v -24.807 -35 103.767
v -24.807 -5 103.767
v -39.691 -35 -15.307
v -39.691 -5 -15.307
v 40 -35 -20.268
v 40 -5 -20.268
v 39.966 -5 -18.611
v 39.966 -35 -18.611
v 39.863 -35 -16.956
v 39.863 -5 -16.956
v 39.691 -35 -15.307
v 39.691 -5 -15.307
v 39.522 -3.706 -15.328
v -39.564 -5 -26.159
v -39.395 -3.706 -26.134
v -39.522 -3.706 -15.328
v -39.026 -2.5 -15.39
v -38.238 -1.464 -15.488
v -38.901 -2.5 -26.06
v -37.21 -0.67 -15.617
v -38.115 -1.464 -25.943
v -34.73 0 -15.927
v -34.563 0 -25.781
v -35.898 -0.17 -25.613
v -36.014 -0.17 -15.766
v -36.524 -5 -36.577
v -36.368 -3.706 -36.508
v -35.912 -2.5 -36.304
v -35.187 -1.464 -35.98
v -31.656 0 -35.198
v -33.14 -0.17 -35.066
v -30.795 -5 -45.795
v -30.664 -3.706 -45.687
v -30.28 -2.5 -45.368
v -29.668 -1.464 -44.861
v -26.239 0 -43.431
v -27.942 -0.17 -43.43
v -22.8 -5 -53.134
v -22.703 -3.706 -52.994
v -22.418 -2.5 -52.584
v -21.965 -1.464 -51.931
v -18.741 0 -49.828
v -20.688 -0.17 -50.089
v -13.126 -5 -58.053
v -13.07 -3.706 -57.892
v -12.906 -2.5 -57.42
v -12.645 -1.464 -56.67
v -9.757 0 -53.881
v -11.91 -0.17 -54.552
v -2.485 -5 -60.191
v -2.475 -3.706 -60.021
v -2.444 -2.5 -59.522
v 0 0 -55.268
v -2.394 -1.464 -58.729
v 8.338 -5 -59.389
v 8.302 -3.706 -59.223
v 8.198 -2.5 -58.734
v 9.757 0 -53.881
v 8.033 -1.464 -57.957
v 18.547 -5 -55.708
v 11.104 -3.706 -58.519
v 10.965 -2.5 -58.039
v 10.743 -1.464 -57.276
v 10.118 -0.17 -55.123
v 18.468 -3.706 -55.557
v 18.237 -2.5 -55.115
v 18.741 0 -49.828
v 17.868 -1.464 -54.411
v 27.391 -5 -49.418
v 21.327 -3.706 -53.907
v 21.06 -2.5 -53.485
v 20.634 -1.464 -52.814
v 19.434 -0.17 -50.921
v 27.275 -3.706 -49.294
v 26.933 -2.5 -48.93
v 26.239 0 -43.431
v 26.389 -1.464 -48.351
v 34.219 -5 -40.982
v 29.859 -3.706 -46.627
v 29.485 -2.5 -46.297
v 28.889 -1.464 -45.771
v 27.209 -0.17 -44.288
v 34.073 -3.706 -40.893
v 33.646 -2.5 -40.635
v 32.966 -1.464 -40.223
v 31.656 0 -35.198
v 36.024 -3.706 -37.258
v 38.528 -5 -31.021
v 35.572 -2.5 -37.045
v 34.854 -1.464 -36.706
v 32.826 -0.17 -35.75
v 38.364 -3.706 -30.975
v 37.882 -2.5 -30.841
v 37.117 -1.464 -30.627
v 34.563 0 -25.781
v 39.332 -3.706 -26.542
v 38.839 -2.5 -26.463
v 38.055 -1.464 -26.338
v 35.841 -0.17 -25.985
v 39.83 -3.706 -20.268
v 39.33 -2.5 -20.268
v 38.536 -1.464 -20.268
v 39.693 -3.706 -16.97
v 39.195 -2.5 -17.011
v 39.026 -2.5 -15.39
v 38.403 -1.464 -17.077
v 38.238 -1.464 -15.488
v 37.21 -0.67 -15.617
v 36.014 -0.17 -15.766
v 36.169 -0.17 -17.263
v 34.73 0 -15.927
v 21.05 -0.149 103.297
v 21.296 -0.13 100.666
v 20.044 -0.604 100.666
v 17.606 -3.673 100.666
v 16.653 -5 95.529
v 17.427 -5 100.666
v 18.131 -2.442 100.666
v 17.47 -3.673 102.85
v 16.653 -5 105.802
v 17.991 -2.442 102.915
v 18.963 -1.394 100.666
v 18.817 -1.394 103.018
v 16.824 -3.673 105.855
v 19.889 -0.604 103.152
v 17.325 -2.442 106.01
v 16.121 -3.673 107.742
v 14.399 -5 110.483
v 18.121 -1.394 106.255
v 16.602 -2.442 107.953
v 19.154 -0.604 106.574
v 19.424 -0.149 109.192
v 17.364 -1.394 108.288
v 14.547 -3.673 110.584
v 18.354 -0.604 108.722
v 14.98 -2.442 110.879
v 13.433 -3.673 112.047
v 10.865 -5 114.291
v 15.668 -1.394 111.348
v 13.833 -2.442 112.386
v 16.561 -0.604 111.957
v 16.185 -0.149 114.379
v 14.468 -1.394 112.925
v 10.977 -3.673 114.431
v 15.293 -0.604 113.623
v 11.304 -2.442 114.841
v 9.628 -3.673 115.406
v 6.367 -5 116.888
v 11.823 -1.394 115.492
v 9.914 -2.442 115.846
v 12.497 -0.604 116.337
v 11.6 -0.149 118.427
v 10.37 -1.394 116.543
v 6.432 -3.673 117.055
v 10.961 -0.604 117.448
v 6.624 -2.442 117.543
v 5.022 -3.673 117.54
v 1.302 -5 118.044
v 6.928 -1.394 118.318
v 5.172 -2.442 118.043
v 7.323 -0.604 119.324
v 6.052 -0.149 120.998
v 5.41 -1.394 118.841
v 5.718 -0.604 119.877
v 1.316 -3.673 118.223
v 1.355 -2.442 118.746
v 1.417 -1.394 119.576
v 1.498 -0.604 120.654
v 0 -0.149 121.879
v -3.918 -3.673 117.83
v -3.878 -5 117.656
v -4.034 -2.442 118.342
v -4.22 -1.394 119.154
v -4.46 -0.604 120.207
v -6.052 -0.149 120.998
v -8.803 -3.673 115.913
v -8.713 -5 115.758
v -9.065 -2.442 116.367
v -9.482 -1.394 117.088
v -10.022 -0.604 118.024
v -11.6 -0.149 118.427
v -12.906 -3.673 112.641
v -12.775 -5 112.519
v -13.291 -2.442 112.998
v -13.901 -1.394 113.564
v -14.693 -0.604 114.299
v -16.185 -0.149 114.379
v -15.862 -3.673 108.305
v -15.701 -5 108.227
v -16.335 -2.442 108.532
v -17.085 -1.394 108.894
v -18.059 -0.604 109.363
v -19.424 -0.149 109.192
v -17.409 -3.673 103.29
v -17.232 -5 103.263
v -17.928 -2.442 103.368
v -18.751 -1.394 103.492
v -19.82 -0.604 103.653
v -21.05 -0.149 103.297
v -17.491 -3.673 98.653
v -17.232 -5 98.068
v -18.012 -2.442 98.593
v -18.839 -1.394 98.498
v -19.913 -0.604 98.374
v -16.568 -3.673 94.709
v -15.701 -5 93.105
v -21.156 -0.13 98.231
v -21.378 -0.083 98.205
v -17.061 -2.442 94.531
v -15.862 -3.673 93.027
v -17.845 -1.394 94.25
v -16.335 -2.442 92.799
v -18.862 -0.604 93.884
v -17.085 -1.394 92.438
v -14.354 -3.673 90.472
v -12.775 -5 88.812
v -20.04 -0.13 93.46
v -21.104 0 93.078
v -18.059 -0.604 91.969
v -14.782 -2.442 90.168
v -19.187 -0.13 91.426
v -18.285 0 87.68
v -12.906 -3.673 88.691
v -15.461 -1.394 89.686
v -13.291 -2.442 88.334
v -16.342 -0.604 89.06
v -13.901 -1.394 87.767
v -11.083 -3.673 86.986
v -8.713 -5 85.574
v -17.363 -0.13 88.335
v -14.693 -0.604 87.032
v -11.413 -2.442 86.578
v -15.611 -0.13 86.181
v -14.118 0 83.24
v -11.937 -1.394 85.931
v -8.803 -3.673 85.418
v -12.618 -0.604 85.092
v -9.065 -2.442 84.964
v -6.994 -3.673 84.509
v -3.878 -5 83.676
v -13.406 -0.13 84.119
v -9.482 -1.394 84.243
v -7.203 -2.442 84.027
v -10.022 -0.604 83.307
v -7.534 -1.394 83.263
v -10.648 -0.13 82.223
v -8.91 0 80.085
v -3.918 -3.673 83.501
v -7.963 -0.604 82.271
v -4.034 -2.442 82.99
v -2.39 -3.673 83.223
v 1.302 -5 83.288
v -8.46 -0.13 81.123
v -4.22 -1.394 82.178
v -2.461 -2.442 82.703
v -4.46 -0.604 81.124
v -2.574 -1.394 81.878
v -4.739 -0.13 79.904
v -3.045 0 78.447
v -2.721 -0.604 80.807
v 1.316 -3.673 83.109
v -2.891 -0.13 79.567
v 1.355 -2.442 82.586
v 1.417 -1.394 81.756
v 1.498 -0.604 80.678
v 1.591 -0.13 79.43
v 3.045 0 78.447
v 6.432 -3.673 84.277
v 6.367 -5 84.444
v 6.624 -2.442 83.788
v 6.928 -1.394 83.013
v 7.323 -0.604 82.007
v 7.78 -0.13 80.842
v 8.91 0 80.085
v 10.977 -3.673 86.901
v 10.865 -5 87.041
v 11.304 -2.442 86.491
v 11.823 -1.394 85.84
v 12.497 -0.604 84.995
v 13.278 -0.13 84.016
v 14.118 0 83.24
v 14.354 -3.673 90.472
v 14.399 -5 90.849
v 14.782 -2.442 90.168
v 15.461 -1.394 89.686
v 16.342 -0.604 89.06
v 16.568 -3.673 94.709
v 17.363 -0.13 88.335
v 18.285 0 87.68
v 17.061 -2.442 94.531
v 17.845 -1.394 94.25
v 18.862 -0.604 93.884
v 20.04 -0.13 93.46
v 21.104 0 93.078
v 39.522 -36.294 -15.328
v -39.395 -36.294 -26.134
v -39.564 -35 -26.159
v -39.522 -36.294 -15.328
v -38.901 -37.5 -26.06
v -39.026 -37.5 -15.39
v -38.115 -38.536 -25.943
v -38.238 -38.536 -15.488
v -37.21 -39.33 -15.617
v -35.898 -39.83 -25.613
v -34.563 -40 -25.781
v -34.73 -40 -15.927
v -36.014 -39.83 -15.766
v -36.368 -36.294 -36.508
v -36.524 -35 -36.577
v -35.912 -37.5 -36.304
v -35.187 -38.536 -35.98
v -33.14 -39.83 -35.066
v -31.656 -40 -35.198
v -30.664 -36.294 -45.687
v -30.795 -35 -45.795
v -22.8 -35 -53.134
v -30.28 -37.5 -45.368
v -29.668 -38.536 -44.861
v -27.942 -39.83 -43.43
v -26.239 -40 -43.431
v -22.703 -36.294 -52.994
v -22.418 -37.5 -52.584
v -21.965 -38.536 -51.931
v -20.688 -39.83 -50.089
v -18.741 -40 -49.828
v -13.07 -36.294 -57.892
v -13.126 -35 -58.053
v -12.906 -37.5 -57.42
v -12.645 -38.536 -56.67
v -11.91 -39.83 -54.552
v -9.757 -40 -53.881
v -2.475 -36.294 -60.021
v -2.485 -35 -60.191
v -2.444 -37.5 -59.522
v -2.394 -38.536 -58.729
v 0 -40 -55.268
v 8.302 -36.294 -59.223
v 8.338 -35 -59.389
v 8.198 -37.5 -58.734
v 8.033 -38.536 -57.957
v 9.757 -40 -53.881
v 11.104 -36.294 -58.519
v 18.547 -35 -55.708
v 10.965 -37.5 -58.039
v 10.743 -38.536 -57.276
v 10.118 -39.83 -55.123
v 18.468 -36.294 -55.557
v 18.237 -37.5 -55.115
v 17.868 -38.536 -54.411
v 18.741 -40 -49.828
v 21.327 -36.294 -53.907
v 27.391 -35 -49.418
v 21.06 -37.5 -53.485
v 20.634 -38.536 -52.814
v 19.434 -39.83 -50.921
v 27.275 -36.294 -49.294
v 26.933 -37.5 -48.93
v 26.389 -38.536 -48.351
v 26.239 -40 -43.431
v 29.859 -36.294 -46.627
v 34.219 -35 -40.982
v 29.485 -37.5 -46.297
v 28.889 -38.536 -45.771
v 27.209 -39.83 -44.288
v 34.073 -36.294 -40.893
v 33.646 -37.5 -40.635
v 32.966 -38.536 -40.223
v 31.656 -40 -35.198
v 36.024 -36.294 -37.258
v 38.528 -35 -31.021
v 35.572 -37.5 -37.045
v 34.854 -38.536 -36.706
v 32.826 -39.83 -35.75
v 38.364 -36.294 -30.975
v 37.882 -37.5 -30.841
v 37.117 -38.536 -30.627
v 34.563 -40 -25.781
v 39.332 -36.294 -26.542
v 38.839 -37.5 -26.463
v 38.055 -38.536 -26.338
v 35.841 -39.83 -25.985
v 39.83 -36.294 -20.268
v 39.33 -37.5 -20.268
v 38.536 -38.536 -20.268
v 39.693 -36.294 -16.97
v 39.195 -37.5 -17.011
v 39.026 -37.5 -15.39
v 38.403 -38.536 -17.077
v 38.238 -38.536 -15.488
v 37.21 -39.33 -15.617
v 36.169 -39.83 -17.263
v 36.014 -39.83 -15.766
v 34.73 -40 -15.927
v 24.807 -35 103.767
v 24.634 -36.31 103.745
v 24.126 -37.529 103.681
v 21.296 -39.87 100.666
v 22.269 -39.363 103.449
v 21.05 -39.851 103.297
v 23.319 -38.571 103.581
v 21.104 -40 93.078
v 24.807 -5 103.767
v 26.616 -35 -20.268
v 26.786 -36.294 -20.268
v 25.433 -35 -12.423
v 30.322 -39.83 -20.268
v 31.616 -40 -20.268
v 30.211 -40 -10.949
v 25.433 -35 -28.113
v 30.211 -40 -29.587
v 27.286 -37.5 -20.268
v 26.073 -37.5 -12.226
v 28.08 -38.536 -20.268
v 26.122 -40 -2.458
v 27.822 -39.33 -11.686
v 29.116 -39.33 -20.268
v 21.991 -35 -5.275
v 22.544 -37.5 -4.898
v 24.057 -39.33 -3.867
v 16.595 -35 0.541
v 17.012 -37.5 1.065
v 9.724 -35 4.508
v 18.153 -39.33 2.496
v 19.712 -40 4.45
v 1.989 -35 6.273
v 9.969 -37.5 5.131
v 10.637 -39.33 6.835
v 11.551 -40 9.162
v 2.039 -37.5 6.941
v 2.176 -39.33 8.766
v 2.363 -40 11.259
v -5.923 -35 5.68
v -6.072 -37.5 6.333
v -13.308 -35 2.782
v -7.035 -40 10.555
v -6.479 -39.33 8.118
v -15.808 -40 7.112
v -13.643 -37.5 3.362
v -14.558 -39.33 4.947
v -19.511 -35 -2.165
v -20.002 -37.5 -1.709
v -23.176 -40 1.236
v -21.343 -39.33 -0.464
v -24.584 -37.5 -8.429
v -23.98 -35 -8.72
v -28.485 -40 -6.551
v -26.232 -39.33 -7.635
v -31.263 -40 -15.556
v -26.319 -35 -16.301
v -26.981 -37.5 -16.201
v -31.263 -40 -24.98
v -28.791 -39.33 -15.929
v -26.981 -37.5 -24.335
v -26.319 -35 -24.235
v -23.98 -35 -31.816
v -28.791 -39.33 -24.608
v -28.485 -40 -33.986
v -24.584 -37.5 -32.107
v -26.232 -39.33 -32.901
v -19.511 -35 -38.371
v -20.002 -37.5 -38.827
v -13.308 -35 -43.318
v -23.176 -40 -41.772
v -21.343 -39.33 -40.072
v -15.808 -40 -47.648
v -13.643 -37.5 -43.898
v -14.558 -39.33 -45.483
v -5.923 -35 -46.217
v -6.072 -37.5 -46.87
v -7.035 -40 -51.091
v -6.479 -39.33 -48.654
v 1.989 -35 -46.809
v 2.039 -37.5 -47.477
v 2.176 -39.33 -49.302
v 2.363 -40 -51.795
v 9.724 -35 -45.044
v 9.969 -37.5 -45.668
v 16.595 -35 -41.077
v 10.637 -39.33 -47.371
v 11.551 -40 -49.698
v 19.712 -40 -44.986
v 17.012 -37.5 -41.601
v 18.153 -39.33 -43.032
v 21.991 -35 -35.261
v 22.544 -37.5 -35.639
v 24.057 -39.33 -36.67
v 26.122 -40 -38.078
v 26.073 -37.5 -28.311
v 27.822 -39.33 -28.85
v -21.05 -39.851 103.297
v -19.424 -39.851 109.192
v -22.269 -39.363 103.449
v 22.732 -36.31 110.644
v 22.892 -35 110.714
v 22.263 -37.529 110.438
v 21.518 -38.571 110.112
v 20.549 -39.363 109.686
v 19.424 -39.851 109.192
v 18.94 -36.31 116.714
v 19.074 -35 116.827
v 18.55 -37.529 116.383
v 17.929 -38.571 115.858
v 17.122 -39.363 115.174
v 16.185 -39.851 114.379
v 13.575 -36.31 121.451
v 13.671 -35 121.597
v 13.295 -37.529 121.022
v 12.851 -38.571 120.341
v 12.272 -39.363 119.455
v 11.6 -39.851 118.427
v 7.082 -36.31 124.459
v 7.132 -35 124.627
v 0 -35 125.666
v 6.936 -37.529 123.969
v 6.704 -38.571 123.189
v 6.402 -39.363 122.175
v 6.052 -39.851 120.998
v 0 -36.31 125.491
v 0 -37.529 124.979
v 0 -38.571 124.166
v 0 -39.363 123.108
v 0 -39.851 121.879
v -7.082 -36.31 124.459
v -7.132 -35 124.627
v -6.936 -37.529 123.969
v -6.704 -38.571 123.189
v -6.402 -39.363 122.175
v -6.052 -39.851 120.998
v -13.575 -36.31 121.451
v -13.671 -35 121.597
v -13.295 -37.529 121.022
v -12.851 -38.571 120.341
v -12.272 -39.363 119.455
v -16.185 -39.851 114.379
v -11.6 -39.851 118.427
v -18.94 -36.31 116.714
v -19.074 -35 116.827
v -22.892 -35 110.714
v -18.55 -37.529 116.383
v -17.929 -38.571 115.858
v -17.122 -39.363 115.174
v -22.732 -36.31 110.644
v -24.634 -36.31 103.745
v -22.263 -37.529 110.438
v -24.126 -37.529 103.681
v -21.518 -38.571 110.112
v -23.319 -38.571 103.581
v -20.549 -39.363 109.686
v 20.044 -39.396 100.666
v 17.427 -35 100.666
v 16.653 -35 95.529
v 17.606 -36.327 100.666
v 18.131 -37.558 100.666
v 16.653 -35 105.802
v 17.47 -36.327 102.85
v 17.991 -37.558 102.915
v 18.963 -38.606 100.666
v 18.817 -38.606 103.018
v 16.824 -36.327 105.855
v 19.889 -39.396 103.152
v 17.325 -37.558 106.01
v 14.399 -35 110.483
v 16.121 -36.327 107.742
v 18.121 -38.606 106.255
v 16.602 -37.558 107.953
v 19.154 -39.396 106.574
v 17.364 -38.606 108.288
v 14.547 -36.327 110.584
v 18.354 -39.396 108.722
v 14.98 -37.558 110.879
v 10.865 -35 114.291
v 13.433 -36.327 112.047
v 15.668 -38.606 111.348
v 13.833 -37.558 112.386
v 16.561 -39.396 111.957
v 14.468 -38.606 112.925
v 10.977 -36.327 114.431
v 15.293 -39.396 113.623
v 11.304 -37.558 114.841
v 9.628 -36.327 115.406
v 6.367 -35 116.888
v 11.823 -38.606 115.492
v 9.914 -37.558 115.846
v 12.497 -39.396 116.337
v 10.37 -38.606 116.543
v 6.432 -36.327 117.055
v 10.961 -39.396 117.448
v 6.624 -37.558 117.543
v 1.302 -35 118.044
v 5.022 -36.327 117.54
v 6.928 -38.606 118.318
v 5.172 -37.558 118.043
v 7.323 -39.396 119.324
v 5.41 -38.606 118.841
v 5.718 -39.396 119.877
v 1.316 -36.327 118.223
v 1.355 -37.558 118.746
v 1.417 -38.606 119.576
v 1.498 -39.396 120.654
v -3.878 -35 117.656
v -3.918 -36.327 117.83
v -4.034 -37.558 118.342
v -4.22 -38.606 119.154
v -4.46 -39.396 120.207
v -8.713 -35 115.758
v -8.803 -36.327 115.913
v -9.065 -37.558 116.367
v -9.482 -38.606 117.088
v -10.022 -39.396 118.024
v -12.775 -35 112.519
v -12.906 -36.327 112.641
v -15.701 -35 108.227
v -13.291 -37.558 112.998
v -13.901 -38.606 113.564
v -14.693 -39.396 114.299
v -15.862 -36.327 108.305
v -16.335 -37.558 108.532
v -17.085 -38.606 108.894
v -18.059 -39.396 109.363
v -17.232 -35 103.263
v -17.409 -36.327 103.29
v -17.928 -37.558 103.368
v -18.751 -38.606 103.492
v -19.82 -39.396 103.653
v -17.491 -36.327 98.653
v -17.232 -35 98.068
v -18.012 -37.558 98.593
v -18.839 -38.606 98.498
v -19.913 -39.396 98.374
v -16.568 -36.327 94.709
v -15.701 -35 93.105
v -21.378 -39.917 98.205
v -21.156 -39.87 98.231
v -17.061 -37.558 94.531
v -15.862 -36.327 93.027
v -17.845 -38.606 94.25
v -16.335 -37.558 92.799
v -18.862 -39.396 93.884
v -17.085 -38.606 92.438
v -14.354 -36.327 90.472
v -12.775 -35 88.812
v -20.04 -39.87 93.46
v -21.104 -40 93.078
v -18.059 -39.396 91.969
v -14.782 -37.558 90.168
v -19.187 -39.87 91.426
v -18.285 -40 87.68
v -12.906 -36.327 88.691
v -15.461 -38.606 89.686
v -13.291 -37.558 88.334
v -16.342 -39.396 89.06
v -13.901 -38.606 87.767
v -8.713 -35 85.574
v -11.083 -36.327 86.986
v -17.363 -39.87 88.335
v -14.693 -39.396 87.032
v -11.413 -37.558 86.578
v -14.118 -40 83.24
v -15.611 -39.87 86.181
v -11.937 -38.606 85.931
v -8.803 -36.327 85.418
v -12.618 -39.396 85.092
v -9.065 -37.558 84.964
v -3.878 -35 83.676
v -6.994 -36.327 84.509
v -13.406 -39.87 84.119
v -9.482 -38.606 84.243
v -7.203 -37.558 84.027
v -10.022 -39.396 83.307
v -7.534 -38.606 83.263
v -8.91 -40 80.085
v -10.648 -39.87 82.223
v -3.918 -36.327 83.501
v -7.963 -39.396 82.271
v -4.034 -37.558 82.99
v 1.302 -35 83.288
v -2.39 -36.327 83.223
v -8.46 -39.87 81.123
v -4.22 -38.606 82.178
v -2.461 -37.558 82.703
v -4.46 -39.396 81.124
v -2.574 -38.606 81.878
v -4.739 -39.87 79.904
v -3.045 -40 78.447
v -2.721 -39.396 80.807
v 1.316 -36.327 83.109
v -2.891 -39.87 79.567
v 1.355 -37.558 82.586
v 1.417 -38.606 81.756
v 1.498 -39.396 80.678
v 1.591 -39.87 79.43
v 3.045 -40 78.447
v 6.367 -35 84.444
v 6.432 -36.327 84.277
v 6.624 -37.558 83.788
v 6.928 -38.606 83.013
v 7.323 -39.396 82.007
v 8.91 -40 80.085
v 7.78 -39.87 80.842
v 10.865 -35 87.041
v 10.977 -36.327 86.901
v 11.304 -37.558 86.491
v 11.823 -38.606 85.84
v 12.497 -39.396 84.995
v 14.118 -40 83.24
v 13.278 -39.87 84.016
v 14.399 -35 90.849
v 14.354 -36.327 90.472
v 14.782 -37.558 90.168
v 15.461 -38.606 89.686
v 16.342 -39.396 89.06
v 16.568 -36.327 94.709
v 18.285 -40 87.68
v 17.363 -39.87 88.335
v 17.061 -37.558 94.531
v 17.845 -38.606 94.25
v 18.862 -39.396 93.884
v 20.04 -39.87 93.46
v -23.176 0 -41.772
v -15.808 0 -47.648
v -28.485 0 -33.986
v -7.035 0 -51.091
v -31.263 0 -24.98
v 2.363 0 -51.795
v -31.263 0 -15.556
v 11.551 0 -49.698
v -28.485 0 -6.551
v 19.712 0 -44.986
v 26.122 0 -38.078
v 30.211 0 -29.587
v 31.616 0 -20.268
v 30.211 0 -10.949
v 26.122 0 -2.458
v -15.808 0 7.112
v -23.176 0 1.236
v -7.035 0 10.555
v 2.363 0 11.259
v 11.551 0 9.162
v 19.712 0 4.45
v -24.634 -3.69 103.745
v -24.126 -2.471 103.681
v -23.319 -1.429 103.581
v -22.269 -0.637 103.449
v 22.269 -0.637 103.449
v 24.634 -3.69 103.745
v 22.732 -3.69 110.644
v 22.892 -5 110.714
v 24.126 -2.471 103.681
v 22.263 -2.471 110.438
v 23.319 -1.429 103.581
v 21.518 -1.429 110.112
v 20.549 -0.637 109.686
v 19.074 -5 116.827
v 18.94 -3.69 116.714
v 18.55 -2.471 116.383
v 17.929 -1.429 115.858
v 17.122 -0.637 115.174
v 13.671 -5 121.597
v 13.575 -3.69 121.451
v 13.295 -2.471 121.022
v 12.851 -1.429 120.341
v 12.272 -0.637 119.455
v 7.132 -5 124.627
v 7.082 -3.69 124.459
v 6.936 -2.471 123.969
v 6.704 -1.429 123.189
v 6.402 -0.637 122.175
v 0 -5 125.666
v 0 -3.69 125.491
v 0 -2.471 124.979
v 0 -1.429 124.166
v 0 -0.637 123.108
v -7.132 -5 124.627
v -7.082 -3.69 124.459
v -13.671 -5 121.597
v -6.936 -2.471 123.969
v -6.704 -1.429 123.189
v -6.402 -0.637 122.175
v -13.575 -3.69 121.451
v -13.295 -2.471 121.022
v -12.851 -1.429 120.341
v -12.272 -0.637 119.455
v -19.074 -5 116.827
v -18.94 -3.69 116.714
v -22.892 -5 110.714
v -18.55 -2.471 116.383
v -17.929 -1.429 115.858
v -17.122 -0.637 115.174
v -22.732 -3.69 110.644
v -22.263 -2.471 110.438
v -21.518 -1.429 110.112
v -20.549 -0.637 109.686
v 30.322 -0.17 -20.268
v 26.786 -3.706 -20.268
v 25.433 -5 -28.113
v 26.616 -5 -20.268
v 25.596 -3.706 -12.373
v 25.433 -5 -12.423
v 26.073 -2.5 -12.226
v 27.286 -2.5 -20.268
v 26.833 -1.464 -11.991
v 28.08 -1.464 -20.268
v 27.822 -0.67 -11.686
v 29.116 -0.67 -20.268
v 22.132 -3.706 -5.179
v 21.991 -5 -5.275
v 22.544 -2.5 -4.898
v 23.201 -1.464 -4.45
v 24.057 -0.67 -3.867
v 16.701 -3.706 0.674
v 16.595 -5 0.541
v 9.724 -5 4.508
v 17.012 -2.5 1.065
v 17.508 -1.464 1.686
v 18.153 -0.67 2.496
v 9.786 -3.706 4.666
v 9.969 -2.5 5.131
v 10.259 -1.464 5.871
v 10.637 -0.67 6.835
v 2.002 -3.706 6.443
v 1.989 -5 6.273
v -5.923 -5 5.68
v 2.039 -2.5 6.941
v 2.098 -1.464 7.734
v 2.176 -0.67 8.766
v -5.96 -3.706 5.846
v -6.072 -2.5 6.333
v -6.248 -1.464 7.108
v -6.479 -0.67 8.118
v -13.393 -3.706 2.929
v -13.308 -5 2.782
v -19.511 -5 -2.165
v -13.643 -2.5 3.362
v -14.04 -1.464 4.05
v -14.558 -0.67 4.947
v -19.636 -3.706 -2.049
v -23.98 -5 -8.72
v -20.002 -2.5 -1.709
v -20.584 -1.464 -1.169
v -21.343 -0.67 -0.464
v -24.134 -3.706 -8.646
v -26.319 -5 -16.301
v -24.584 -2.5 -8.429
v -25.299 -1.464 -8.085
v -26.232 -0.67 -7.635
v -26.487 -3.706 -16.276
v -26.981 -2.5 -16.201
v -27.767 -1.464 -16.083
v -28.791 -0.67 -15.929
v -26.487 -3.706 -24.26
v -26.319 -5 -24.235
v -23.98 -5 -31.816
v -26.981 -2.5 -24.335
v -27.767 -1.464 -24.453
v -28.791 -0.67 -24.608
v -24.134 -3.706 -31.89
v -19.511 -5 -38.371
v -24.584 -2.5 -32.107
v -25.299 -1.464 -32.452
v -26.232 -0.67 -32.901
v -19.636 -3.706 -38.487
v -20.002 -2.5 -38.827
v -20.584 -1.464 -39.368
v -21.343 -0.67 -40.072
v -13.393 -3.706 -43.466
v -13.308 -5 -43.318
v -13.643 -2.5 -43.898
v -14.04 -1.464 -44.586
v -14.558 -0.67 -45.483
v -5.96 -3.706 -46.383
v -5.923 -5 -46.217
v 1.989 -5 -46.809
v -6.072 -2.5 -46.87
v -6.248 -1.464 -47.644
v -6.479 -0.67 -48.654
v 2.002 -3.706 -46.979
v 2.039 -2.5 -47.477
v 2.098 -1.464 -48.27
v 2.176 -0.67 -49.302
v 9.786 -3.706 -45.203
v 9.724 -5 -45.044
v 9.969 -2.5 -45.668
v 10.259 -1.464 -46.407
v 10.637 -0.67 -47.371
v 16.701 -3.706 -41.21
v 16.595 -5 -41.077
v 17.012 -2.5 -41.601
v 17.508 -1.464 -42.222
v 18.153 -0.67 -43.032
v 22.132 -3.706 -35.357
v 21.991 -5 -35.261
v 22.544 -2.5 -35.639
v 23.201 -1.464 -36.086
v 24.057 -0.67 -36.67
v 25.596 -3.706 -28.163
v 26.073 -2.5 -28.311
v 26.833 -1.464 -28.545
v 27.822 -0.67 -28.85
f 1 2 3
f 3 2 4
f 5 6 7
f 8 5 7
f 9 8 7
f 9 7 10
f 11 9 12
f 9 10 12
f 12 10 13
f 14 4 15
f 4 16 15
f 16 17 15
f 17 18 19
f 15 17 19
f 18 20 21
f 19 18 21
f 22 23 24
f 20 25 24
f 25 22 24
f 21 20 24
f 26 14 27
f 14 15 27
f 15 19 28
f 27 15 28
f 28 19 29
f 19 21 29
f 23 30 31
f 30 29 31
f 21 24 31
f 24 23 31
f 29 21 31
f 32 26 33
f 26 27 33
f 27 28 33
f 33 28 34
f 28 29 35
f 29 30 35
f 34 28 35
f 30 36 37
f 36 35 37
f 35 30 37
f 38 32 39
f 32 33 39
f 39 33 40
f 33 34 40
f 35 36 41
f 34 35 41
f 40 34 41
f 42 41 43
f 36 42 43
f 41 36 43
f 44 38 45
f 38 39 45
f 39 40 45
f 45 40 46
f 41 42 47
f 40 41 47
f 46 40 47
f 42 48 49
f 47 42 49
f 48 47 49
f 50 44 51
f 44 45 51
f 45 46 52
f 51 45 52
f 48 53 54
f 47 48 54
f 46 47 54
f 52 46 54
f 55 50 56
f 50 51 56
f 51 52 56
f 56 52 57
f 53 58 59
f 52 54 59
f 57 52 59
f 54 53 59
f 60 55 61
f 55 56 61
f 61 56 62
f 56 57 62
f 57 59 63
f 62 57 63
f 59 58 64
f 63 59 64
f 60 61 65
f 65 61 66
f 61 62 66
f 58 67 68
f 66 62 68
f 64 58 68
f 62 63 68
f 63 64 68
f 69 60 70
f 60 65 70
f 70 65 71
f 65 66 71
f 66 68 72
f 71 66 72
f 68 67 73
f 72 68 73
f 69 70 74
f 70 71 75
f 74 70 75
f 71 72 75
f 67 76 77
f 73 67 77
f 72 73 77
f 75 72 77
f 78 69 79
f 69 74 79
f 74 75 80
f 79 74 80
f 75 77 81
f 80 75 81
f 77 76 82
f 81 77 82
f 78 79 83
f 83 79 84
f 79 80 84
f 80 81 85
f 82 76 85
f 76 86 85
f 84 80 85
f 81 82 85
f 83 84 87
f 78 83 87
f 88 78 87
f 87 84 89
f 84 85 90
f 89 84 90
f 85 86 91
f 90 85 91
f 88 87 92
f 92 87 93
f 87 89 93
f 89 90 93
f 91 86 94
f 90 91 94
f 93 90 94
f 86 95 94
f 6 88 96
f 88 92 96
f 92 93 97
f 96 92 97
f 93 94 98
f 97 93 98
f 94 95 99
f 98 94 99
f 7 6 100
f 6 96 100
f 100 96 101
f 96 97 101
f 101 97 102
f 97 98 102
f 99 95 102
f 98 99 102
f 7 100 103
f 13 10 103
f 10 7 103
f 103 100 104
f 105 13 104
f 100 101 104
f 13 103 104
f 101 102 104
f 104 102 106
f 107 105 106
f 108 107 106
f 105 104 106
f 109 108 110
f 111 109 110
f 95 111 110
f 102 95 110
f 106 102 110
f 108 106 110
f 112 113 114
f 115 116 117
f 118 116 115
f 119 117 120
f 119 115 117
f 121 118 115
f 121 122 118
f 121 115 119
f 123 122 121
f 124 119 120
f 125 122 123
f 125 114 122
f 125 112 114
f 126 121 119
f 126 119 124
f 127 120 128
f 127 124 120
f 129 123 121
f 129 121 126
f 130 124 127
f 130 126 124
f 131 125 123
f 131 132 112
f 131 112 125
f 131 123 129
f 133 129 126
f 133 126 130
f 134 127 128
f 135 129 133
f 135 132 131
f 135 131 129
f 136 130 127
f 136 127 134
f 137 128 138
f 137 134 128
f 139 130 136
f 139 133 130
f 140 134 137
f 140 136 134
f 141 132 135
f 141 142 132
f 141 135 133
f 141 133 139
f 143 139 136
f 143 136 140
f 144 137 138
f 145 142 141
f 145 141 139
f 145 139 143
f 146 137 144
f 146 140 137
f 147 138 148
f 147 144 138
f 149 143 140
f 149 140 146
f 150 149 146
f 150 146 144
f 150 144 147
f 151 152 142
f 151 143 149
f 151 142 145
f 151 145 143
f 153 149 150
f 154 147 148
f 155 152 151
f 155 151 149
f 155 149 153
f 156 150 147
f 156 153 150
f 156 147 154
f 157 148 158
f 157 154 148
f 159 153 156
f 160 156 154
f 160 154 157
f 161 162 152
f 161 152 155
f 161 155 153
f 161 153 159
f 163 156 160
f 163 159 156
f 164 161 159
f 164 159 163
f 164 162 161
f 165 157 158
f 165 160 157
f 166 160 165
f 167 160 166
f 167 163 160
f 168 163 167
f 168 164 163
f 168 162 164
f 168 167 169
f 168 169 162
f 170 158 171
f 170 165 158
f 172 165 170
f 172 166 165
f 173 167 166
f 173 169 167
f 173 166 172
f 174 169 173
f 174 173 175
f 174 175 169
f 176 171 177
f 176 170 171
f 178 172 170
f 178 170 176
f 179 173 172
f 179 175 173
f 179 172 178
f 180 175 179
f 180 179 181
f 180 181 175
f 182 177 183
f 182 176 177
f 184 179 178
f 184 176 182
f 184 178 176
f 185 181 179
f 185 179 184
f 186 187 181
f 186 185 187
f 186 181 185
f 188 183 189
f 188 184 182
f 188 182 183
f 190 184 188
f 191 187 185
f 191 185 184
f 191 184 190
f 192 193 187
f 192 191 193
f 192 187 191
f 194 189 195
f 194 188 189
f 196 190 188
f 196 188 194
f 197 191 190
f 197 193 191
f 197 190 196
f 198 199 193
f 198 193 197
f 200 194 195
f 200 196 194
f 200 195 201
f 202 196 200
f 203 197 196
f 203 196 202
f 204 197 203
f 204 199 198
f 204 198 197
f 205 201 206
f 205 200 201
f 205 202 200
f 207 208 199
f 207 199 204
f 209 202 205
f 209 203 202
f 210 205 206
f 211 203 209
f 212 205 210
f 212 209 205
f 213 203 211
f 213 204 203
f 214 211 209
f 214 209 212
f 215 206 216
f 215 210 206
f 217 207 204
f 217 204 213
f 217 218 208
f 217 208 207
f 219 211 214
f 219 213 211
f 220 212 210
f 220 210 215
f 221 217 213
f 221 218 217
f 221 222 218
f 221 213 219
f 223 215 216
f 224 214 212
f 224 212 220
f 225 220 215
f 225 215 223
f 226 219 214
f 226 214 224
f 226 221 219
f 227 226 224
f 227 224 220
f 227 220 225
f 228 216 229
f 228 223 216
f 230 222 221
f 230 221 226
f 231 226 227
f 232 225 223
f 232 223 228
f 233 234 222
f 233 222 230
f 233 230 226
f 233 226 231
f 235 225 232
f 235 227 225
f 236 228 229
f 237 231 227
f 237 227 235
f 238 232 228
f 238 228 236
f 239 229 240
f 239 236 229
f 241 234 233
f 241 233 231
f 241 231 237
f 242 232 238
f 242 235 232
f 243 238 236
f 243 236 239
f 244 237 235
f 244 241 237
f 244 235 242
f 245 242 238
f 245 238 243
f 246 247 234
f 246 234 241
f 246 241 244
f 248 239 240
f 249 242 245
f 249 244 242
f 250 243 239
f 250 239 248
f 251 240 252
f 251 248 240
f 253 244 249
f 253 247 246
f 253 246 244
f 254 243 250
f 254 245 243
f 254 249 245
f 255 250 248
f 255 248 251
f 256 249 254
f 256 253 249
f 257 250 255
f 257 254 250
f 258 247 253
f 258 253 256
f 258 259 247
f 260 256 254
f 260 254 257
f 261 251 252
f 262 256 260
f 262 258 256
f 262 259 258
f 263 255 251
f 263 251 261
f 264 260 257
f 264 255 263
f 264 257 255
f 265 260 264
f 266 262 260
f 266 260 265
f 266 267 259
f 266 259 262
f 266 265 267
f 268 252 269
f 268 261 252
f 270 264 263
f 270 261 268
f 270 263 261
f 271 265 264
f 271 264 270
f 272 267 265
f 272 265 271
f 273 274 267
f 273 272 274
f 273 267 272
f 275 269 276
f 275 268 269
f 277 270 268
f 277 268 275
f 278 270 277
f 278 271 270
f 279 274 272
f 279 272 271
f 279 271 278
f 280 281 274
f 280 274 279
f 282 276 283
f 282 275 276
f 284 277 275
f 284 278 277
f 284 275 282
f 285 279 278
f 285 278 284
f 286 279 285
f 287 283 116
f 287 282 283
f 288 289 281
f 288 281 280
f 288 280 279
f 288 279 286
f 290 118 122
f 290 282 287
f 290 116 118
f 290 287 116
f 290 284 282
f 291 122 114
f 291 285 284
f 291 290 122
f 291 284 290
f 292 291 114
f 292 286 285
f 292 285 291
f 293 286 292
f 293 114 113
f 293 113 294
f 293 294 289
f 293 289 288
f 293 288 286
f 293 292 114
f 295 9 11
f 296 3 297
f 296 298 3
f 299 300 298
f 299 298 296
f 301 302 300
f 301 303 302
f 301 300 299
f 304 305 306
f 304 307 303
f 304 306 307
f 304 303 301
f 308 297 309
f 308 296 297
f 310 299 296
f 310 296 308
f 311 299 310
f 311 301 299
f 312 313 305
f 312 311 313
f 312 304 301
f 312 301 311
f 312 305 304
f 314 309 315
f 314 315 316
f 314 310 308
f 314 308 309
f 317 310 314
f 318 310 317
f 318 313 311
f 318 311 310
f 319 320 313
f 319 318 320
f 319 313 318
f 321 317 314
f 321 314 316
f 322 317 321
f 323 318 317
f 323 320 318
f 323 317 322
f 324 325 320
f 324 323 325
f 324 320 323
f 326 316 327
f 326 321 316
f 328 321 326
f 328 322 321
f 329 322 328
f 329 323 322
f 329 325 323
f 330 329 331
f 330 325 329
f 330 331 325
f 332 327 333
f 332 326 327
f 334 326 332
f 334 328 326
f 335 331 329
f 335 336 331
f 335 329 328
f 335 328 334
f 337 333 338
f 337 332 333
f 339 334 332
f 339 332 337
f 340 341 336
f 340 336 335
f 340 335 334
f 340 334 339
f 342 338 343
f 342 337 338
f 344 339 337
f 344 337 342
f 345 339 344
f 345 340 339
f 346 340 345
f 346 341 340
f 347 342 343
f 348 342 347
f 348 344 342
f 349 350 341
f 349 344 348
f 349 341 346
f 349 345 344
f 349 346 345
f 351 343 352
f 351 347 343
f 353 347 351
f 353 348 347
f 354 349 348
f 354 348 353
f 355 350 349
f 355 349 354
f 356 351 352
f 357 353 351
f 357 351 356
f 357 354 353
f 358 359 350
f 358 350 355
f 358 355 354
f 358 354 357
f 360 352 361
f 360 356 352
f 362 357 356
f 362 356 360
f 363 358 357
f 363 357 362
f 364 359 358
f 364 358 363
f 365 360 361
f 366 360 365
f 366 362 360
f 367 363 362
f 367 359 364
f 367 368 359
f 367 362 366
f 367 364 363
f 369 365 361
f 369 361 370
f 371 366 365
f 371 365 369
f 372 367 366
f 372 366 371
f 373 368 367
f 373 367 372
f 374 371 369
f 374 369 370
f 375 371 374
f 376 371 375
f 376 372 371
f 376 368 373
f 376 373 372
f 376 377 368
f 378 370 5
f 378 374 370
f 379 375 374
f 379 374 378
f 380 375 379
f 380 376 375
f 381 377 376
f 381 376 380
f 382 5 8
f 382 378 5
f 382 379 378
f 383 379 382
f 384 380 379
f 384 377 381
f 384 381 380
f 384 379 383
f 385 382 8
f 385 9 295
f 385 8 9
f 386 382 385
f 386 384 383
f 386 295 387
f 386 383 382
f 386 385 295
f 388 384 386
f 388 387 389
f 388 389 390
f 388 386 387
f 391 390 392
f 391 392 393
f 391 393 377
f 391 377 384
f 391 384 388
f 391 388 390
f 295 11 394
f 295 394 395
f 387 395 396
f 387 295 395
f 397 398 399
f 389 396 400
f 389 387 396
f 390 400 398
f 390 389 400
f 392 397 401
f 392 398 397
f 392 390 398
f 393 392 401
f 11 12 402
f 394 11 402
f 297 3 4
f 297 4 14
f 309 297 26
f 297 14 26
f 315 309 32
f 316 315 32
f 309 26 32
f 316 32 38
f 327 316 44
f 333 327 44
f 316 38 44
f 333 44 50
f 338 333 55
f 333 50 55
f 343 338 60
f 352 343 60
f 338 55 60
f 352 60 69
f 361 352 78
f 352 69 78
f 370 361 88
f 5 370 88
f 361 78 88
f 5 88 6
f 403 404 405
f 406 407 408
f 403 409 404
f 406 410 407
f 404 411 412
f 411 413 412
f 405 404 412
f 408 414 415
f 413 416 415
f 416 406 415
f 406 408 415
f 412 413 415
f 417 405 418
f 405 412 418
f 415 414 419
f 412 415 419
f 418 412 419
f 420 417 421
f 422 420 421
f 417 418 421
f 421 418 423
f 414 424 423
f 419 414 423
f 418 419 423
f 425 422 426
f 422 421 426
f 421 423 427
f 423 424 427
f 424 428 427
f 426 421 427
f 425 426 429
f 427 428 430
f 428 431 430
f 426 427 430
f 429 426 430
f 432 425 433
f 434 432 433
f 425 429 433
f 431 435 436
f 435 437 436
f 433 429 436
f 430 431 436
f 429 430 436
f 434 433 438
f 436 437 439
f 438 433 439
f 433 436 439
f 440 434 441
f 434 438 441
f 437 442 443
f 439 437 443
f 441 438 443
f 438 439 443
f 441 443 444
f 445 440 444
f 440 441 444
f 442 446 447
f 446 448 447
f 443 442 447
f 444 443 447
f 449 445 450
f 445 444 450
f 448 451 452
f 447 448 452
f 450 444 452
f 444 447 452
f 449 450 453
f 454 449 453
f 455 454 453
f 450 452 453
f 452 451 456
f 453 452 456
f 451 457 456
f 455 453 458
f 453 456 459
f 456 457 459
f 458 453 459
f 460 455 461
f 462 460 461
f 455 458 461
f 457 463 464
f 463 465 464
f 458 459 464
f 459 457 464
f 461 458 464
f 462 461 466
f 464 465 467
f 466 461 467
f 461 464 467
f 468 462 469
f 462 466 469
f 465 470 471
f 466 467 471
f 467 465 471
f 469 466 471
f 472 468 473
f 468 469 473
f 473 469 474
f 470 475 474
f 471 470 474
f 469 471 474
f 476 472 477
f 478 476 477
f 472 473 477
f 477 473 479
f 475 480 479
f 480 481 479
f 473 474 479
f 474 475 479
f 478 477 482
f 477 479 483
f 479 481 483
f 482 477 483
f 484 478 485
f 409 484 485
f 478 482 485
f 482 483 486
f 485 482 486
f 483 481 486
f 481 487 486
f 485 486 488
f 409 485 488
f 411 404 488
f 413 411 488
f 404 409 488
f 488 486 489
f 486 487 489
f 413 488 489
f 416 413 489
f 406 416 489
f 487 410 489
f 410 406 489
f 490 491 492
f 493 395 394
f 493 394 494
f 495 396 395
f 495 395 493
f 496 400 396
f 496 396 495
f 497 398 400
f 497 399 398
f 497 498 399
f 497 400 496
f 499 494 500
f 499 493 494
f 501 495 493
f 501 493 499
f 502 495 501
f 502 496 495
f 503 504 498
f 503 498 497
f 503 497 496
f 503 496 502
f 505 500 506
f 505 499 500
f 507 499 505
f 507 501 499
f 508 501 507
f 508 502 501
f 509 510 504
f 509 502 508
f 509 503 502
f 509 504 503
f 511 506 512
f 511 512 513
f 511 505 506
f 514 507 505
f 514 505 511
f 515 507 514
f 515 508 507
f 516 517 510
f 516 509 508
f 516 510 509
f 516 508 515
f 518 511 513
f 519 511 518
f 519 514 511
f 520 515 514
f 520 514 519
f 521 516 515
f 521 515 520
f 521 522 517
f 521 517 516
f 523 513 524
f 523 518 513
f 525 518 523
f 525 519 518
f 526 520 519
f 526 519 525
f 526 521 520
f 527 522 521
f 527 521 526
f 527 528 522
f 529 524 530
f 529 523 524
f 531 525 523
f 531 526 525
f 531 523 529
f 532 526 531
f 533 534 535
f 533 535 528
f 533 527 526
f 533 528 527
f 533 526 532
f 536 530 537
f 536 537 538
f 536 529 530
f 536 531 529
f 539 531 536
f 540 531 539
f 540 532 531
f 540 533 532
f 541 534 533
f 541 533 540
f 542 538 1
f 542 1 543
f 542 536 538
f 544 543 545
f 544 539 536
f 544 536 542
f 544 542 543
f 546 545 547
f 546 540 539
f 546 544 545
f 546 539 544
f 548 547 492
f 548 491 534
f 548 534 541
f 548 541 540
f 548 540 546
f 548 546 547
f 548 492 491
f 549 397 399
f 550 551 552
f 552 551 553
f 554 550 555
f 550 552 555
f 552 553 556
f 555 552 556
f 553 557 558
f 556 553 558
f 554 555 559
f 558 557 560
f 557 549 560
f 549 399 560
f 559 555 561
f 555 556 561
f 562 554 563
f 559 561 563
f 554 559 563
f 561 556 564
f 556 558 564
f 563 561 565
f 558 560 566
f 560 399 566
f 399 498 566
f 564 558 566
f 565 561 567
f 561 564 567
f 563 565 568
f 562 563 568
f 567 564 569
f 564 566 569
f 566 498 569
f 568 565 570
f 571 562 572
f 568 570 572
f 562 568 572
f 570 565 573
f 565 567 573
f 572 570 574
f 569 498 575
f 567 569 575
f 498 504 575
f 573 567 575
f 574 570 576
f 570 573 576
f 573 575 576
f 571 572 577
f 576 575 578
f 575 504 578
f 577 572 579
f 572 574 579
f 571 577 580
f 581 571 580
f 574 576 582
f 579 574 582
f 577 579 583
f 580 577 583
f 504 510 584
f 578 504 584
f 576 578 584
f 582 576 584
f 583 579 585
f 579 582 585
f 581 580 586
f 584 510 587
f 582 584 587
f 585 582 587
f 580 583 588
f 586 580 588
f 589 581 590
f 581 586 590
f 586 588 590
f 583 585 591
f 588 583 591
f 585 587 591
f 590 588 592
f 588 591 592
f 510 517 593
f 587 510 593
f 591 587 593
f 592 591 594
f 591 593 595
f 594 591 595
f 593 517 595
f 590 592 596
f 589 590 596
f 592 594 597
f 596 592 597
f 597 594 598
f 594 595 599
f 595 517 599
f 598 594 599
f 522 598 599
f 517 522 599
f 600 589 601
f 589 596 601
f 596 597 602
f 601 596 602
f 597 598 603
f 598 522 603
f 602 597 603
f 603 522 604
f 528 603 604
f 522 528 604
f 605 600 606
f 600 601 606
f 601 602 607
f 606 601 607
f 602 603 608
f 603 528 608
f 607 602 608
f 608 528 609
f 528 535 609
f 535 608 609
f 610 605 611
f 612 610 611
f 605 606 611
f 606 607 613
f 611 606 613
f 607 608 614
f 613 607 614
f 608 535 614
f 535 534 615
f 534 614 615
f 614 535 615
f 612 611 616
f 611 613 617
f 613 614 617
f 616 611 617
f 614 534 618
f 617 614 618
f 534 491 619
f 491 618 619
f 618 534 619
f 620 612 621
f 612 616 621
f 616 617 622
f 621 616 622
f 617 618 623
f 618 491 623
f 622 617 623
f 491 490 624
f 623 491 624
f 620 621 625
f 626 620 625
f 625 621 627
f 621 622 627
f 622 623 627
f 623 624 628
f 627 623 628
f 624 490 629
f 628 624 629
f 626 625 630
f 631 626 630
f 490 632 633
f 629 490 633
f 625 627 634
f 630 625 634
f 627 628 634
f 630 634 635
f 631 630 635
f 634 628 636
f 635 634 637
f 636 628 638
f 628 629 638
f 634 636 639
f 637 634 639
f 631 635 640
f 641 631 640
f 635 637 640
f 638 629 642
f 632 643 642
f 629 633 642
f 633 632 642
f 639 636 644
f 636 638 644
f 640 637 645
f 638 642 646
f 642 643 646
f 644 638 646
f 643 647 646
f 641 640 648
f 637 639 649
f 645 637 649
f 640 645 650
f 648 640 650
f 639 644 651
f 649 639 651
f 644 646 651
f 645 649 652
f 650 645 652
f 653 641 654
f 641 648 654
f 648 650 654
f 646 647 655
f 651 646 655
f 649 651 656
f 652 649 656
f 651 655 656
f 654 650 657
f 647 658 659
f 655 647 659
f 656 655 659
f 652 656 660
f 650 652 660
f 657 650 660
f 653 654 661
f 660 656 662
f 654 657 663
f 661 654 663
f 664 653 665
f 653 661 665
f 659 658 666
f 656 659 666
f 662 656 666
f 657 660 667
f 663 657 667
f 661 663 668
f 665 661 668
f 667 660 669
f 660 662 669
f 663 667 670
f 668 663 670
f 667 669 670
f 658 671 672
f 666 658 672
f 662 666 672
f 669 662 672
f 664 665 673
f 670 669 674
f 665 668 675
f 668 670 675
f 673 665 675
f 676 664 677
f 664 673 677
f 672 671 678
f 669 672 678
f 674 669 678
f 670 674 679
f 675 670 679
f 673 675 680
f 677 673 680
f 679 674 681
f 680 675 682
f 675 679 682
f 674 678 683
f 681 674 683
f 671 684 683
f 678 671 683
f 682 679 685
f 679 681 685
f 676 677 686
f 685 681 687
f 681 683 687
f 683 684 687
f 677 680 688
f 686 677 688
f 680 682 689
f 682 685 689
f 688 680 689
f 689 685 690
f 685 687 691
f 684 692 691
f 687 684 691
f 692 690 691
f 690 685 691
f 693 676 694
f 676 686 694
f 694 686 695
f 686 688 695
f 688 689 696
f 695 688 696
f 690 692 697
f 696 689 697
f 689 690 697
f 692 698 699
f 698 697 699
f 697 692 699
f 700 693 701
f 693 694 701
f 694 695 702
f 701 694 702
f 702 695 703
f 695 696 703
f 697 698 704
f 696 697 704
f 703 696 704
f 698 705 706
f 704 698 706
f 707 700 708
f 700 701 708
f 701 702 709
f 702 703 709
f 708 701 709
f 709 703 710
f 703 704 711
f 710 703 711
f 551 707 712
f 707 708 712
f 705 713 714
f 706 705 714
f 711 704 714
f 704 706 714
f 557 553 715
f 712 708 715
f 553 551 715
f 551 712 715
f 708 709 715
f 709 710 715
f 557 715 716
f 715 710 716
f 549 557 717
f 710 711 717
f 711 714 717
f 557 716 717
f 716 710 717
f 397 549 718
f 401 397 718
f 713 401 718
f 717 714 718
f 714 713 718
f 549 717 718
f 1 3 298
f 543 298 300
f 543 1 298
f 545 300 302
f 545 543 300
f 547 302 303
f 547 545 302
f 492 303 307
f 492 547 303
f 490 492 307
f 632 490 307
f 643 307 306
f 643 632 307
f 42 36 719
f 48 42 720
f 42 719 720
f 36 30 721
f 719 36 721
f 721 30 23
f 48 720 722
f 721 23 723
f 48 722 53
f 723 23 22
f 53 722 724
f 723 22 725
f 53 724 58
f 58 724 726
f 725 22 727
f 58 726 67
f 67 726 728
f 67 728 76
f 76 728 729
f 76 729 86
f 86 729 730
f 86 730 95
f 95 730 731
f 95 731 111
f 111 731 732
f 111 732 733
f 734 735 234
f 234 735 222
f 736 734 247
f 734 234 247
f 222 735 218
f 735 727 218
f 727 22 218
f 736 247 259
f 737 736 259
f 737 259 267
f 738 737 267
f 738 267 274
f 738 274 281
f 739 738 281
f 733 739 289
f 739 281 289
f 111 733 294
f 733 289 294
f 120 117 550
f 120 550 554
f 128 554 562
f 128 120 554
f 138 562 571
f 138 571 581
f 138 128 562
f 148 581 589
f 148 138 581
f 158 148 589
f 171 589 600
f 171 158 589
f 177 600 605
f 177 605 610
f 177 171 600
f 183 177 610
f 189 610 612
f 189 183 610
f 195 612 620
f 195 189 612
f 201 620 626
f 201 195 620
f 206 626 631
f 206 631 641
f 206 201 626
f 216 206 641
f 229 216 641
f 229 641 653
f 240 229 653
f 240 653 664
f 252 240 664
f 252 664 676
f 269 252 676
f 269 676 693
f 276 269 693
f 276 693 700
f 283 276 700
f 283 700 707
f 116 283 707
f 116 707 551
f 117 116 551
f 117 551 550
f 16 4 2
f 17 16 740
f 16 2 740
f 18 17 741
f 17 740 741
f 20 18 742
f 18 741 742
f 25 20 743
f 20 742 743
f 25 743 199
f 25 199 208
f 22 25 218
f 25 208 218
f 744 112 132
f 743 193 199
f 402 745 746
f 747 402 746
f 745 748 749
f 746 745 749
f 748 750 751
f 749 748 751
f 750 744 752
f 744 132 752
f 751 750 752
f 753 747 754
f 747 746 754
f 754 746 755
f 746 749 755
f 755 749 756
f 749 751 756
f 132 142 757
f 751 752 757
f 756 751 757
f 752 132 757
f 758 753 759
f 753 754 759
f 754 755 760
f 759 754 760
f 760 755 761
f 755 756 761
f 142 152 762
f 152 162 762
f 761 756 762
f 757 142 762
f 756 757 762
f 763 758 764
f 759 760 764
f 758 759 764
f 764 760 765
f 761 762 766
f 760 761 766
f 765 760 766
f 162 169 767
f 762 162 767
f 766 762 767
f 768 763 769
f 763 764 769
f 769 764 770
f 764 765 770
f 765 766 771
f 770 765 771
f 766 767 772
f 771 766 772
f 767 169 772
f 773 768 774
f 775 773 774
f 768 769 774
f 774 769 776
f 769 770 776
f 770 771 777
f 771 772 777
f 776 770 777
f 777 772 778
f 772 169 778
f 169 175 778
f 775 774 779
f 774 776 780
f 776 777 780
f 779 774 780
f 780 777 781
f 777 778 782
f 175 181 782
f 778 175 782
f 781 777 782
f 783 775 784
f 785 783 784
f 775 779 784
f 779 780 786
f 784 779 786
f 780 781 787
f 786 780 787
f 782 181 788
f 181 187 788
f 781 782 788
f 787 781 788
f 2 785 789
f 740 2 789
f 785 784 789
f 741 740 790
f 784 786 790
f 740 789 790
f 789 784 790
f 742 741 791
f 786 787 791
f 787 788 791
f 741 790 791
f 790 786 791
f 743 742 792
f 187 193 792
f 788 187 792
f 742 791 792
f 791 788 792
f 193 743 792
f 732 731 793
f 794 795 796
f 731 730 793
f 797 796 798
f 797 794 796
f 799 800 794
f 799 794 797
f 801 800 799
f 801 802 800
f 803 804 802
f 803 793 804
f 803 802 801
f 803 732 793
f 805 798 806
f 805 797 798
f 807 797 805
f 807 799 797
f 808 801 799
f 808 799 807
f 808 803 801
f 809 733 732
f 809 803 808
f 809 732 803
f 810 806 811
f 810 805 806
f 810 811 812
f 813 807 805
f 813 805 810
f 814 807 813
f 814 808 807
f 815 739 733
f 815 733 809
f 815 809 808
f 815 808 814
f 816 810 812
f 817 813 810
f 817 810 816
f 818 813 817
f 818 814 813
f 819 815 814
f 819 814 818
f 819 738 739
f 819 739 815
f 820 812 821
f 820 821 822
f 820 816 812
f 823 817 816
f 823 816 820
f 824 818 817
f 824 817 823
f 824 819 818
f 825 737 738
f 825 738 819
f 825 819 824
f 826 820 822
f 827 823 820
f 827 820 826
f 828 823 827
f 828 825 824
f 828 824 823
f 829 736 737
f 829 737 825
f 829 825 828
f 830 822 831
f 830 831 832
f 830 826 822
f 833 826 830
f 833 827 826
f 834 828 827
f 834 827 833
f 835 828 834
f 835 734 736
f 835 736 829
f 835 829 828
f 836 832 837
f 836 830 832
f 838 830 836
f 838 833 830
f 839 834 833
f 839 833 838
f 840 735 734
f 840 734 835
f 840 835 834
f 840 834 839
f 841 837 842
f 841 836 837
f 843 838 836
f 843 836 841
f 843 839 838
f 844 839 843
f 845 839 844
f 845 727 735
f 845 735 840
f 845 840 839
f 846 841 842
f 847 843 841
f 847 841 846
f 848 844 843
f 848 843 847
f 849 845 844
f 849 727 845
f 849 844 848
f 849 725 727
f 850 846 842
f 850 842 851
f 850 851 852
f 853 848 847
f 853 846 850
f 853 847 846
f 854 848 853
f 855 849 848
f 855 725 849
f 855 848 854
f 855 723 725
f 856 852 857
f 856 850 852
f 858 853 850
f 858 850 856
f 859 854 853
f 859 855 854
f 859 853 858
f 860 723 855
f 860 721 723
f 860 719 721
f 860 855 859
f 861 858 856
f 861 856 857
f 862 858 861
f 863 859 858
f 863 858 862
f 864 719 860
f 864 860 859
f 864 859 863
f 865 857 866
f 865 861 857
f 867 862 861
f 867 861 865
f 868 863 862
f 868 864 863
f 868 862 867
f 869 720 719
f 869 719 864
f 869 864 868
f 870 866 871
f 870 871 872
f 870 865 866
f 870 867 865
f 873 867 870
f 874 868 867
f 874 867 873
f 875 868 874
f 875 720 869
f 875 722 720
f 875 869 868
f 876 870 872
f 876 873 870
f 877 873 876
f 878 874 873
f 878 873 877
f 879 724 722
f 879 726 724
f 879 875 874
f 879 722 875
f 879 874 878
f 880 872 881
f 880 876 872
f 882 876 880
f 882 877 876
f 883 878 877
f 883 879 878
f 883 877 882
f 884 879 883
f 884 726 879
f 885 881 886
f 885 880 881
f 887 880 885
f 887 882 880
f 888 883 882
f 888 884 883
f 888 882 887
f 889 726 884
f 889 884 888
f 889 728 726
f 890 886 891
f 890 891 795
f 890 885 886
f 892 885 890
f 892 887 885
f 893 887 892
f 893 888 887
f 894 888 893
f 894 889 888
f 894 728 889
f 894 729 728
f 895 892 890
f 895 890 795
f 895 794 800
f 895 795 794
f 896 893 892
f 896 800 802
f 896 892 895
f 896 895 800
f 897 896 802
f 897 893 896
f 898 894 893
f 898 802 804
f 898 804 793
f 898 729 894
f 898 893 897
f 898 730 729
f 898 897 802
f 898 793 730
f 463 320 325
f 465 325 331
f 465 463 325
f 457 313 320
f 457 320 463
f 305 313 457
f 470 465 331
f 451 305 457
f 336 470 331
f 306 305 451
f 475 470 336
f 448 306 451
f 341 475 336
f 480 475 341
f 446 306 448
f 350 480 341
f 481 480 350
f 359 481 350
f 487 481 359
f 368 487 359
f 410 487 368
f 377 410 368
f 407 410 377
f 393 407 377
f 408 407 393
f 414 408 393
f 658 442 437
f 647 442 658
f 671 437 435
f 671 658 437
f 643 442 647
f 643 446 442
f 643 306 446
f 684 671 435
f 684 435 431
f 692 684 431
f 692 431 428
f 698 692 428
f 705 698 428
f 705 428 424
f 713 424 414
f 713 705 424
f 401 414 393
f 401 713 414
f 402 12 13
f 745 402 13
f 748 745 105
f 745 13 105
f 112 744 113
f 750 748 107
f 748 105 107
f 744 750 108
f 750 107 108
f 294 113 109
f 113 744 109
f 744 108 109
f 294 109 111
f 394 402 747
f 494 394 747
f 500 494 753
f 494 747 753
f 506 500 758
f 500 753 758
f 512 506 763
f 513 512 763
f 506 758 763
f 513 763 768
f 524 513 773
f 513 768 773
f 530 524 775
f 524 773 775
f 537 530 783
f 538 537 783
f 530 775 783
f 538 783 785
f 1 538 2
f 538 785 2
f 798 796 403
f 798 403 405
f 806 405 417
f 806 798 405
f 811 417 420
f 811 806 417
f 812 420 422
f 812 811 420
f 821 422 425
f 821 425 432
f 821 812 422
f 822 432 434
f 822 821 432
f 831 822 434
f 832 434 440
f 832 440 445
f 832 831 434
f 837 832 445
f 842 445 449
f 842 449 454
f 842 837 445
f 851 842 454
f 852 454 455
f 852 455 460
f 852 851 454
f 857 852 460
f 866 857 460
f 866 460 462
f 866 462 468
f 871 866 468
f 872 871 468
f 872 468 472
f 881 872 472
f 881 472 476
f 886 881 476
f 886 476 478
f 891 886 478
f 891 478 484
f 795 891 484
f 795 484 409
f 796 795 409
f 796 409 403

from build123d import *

# Parameters (mm, degrees)
F0_R         = 26.615795876
F0_R_2       = 17.4268543136
F1_DEPTH     = 40
F2_T1_DEPTH  = 120
F2_T3_DEPTH  = 120
F2_T14_ANGLE = 165.7499673022
F2_T16_ANGLE = 165.7499673022
F2_T18_ANGLE = 194.2500326978
F2_T20_ANGLE = 194.2500326978


# Not quite as in the source:
# - a fillet or chamfer that OpenCascade refuses, or shapes differently, is made with other operations: its cross-section is extruded or revolved along the edge and cut away or added


with BuildPart() as f1:
    # F0 (on Front) → F1 (new body)
    with BuildSketch(Plane.XZ):
        with BuildLine():
            ThreePointArc((-39.6911150685, -15.3067131157), (-2.4854976623, -60.1908065831), (40, -20.2681024992))
            ThreePointArc((40, -20.2681024992), (39.9227040839, -17.782604837), (39.6911150685, -15.3067131157))
            ThreePointArc((39.6911150685, -15.3067131157), (0, 19.7318975008), (-39.6911150685, -15.3067131157))
        make_face()
        with Locations((0, -20.2681024992)):
            Circle(F0_R, mode=Mode.SUBTRACT)
        with BuildLine():
            ThreePointArc((-39.6911150685, -15.3067131157), (0, 19.7318975008), (39.6911150685, -15.3067131157))
            Line((39.6911150685, -15.3067131157), (24.8069469178, 103.76663209))
            ThreePointArc((24.8069469178, 103.76663209), (24.9516900524, 102.2191997641), (25, 100.6657637252))
            ThreePointArc((25, 100.6657637252), (-1.5534360389, 75.7140736728), (-24.8069469178, 103.76663209))
            Line((-24.8069469178, 103.76663209), (-39.6911150685, -15.3067131157))
        make_face()
        with BuildLine():
            ThreePointArc((25, 100.6657637252), (24.9516900524, 102.2191997641), (24.8069469178, 103.76663209))
            ThreePointArc((24.8069469178, 103.76663209), (0, 125.6657637252), (-24.8069469178, 103.76663209))
            ThreePointArc((-24.8069469178, 103.76663209), (-1.5534360389, 75.7140736728), (25, 100.6657637252))
        make_face()
        with Locations((0, 100.6657637252)):
            Circle(F0_R_2, mode=Mode.SUBTRACT)
    extrude(amount=F1_DEPTH)

    # F2: fillet of radius 5 on 8 edges, made by hand

    # F2_s2 → F2_t1 (cut)
    with BuildSketch(Plane(origin=(2.4945356922, 0, -19.9562855377), x_dir=(0, 1, 0), z_dir=(-0.1240347346, 0, 0.9922778767))):
        with BuildLine():
            ThreePointArc((-5, -37.4860512859), (-1.4644660941, -36.0215851918), (0, -32.4860512859))
            Line((0, -32.4860512859), (0, -37.4860512859))
            Line((0, -37.4860512859), (-5, -37.4860512859))
        make_face()
        with BuildLine():
            ThreePointArc((-35, -37.4860512859), (-38.5355339059, -36.0215851918), (-40, -32.4860512859))
            Line((-40, -32.4860512859), (-40, -37.4860512859))
            Line((-40, -37.4860512859), (-35, -37.4860512859))
        make_face()
    extrude(amount=F2_T1_DEPTH, mode=Mode.SUBTRACT)

    # F2_s4 → F2_t3 (cut)
    with BuildSketch(Plane(origin=(12.3896324585, 0, 99.1170596679), x_dir=(0, 1, 0), z_dir=(-0.1240347346, 0, -0.9922778767))):
        with BuildLine():
            ThreePointArc((-35, -37.4860512859), (-38.5355339059, -36.0215851918), (-40, -32.4860512859))
            Line((-40, -32.4860512859), (-40, -37.4860512859))
            Line((-40, -37.4860512859), (-35, -37.4860512859))
        make_face()
        with BuildLine():
            ThreePointArc((-5, -37.4860512859), (-1.4644660941, -36.0215851918), (0, -32.4860512859))
            Line((0, -32.4860512859), (0, -37.4860512859))
            Line((0, -37.4860512859), (-5, -37.4860512859))
        make_face()
    extrude(amount=F2_T3_DEPTH, mode=Mode.SUBTRACT)

    # F2_s5 → F2_t6 (revolve, cut)
    with BuildSketch(Plane.XY.offset(100.6657637252)):
        with BuildLine():
            ThreePointArc((17.4268543136, -35), (18.8913204077, -38.5355339059), (22.4268543136, -40))
            Line((22.4268543136, -40), (17.4268543136, -40))
            Line((17.4268543136, -40), (17.4268543136, -35))
        make_face()
    revolve(axis=Axis((0, -40, 100.6657637252), (0, -1, 0)), mode=Mode.SUBTRACT)

    # F2_s7 → F2_t8 (revolve, cut)
    with BuildSketch(Plane.XY.offset(-20.2681024992)):
        with BuildLine():
            ThreePointArc((26.615795876, -35), (28.0802619701, -38.5355339059), (31.615795876, -40))
            Line((31.615795876, -40), (26.615795876, -40))
            Line((26.615795876, -40), (26.615795876, -35))
        make_face()
    revolve(axis=Axis((0, -40, -20.2681024992), (0, -1, 0)), mode=Mode.SUBTRACT)

    # F2_s9 → F2_t10 (revolve, cut)
    with BuildSketch(Plane.XY.offset(-20.2681024992)):
        with BuildLine():
            ThreePointArc((26.615795876, -5), (28.0802619701, -1.4644660941), (31.615795876, 0))
            Line((31.615795876, 0), (26.615795876, 0))
            Line((26.615795876, 0), (26.615795876, -5))
        make_face()
    revolve(axis=Axis((0, 0, -20.2681024992), (0, -1, 0)), mode=Mode.SUBTRACT)

    # F2_s11 → F2_t12 (revolve, cut)
    with BuildSketch(Plane.XY.offset(100.6657637252)):
        with BuildLine():
            ThreePointArc((17.4268543136, -5), (18.8913204077, -1.4644660941), (22.4268543136, 0))
            Line((22.4268543136, 0), (17.4268543136, 0))
            Line((17.4268543136, 0), (17.4268543136, -5))
        make_face()
    revolve(axis=Axis((0, 0, 100.6657637252), (0, -1, 0)), mode=Mode.SUBTRACT)

    # F2_s13 → F2_t14 (revolve, cut)
    with BuildSketch(Plane(origin=(-12.3896324585, 0, 99.1170596679), x_dir=(0, 1, 0), z_dir=(0.1240347346, 0, -0.9922778767))):
        with BuildLine():
            ThreePointArc((-5, 37.4860512859), (-1.4644660941, 36.0215851918), (0, 32.4860512859))
            Line((0, 32.4860512859), (0, 37.4860512859))
            Line((0, 37.4860512859), (-5, 37.4860512859))
        make_face()
    revolve(axis=Axis((0, 0, 100.6657637252), (0, -1, 0)), revolution_arc=F2_T14_ANGLE, mode=Mode.SUBTRACT)

    # F2_s15 → F2_t16 (revolve, cut)
    with BuildSketch(Plane(origin=(-12.3896324585, 0, 99.1170596679), x_dir=(0, 1, 0), z_dir=(0.1240347346, 0, -0.9922778767))):
        with BuildLine():
            ThreePointArc((-35, 37.4860512859), (-38.5355339059, 36.0215851918), (-40, 32.4860512859))
            Line((-40, 32.4860512859), (-40, 37.4860512859))
            Line((-40, 37.4860512859), (-35, 37.4860512859))
        make_face()
    revolve(axis=Axis((0, -40, 100.6657637252), (0, -1, 0)), revolution_arc=F2_T16_ANGLE, mode=Mode.SUBTRACT)

    # F2_s17 → F2_t18 (revolve, cut)
    with BuildSketch(Plane(origin=(-2.4945356922, 0, -19.9562855377), x_dir=(0, 1, 0), z_dir=(0.1240347346, 0, 0.9922778767))):
        with BuildLine():
            ThreePointArc((-35, 37.4860512859), (-38.5355339059, 36.0215851918), (-40, 32.4860512859))
            Line((-40, 32.4860512859), (-40, 37.4860512859))
            Line((-40, 37.4860512859), (-35, 37.4860512859))
        make_face()
    revolve(axis=Axis((0, -40, -20.2681024992), (0, -1, 0)), revolution_arc=F2_T18_ANGLE, mode=Mode.SUBTRACT)

    # F2_s19 → F2_t20 (revolve, cut)
    with BuildSketch(Plane(origin=(-2.4945356922, 0, -19.9562855377), x_dir=(0, 1, 0), z_dir=(0.1240347346, 0, 0.9922778767))):
        with BuildLine():
            ThreePointArc((-5, 37.4860512859), (-1.4644660941, 36.0215851918), (0, 32.4860512859))
            Line((0, 32.4860512859), (0, 37.4860512859))
            Line((0, 37.4860512859), (-5, 37.4860512859))
        make_face()
    revolve(axis=Axis((0, 0, -20.2681024992), (0, -1, 0)), revolution_arc=F2_T20_ANGLE, mode=Mode.SUBTRACT)


solid = f1.part
